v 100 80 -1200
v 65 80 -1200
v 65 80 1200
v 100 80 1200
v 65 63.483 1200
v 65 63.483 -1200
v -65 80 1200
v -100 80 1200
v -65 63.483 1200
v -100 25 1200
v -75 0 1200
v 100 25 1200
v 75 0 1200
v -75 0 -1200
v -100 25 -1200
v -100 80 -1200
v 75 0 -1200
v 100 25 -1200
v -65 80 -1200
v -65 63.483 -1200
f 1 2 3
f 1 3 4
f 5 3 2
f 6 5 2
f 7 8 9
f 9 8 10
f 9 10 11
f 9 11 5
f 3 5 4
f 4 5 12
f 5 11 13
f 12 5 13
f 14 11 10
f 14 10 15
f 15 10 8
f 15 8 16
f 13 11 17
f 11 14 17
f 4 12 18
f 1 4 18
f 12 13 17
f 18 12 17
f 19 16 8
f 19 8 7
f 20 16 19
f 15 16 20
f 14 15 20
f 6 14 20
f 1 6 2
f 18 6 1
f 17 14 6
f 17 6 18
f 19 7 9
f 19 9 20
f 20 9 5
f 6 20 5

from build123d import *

# Parameters (mm, degrees)
SKETCH1_W           = 200
SKETCH1_H           = 2400
BOSS_EXTRUDE1_DEPTH = 80
CHAMFER1_SIZE       = 25
SKETCH2_W           = 130
SKETCH2_H           = 2400
CUT_EXTRUDE1_DEPTH  = 16.51744982


with BuildPart() as part:
    # Sketch1 → Boss-Extrude1 (new body)
    with BuildSketch(Plane(origin=(0, 0, 0), x_dir=(1, 0, 0), z_dir=(0, 1, 0))):
        Rectangle(SKETCH1_W, SKETCH1_H)
    extrude(amount=BOSS_EXTRUDE1_DEPTH)

    # Chamfer1
    chamfer1_edges = [part.edges().sort_by_distance(p)[0] for p in [
        (-100, 0, 0),
        (100, 0, 0),
    ]]
    chamfer(chamfer1_edges, length=CHAMFER1_SIZE)

    # Sketch2 → Cut-Extrude1 (cut)
    with BuildSketch(Plane(origin=(0, 80, 0), x_dir=(1, 0, 0), z_dir=(0, 1, 0))):
        Rectangle(SKETCH2_W, SKETCH2_H)
    extrude(amount=-CUT_EXTRUDE1_DEPTH, mode=Mode.SUBTRACT)


solid = part.part
